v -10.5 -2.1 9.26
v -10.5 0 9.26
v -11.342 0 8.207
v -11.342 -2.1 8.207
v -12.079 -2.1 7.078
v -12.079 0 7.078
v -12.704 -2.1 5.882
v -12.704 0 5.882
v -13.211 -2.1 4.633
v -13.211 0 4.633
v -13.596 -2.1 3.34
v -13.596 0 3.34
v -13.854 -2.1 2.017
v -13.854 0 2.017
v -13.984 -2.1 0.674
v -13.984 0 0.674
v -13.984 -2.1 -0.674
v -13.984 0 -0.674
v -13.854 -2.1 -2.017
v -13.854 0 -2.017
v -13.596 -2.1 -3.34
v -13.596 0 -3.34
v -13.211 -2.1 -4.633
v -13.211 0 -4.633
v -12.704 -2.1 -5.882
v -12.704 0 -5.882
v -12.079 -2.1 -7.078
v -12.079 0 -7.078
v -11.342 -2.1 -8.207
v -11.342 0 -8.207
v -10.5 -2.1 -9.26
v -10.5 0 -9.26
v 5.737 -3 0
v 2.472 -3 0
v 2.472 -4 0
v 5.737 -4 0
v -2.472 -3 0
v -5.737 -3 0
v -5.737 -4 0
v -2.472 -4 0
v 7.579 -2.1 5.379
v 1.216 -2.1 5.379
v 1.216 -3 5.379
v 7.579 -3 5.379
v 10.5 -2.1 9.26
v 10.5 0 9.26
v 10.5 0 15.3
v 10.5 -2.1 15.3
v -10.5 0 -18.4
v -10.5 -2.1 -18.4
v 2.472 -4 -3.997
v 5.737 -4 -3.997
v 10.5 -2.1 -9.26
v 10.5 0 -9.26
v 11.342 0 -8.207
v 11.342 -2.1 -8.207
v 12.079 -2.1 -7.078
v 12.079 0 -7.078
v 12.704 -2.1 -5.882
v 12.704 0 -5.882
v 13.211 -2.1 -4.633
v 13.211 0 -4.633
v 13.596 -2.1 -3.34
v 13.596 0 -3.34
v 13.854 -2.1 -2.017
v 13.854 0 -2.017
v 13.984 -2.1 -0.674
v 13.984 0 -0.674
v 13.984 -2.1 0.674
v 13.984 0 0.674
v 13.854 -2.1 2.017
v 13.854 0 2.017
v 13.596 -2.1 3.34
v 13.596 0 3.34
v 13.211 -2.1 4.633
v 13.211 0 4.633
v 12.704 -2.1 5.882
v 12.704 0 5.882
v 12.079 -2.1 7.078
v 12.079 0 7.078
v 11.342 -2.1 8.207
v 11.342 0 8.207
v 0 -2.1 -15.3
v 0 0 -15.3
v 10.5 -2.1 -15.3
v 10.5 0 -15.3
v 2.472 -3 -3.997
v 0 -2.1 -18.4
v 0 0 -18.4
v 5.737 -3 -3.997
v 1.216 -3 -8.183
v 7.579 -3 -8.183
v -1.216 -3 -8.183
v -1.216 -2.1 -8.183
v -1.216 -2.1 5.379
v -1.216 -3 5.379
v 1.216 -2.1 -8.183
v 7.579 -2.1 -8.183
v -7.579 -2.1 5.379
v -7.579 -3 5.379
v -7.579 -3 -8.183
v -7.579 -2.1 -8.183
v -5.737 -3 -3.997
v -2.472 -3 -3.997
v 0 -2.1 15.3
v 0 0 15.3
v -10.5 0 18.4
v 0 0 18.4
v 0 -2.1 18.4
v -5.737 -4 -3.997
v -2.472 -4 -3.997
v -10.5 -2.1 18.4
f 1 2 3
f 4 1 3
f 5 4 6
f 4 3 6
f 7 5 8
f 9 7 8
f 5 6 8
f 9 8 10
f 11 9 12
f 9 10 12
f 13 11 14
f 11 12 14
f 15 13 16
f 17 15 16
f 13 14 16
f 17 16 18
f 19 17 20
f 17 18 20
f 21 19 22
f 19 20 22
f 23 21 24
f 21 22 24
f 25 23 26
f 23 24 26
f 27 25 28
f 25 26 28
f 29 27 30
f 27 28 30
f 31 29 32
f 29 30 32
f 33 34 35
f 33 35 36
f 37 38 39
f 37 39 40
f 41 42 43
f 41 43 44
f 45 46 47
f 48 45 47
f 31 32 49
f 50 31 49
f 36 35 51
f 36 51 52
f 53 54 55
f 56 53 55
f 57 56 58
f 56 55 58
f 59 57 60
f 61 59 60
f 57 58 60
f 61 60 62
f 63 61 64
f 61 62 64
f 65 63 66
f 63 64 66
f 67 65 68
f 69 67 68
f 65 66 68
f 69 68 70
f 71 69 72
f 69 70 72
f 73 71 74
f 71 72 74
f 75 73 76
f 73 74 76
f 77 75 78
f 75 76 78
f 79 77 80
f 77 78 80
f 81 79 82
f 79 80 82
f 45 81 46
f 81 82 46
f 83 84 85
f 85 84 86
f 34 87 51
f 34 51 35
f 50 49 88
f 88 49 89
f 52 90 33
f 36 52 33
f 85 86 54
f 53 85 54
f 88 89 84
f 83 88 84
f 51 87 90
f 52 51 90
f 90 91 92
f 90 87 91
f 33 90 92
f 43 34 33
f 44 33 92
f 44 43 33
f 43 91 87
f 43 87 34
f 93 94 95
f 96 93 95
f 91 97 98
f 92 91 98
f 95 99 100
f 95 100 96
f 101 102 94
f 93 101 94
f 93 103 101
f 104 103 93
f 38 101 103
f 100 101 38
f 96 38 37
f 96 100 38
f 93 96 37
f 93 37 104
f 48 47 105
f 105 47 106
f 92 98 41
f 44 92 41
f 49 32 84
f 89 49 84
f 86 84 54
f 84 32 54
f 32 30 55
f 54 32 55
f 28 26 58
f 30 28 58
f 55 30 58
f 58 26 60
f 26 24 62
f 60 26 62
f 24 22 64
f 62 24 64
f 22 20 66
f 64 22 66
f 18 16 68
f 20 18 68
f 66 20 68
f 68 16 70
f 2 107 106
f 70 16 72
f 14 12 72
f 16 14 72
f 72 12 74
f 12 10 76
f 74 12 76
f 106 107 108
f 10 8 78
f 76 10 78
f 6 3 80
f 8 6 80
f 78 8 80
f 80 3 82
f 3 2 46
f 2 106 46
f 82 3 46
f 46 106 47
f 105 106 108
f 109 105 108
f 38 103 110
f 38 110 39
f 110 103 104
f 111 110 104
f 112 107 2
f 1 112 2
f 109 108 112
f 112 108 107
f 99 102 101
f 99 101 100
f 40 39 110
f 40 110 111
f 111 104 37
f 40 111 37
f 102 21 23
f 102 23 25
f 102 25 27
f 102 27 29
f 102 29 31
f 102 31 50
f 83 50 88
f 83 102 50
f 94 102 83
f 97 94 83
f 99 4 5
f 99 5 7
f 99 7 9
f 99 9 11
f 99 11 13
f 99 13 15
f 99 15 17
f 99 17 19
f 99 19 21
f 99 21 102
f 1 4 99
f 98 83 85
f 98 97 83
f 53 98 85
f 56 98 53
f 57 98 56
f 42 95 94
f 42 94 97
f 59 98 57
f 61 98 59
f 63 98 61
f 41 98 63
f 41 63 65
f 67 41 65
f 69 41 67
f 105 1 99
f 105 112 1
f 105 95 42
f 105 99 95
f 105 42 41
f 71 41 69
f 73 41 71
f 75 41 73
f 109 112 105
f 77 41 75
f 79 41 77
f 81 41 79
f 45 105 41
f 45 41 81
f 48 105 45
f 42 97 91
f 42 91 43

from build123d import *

# Parameters (mm, degrees)
F2_DEPTH = 2.1
F1_W     = 6.362536
F1_H     = 13.562245
F1_W_2   = 3.264985
F1_H_2   = 3.997409
F3_DEPTH = 3
F4_DEPTH = 4


with BuildPart() as f2:
    # F0 (on Front) → F2 (new body)
    with BuildSketch(Plane.XZ):
        with BuildLine():
            Line((-10.5, 18.4), (-10.5, 9.26013))
            ThreePointArc((-10.5, 9.26013), (-14, 0), (-10.5, -9.26013))
            Line((-10.5, -9.26013), (-10.5, -18.4))
            Line((-10.5, -18.4), (0, -18.4))
            Line((0, -18.4), (0, -15.3))
            Line((0, -15.3), (10.5, -15.3))
            Line((10.5, -15.3), (10.5, -9.26013))
            ThreePointArc((10.5, -9.26013), (14, 0), (10.5, 9.26013))
            Line((10.5, 9.26013), (10.5, 15.3))
            Line((10.5, 15.3), (0, 15.3))
            Line((0, 15.3), (0, 18.4))
            Line((0, 18.4), (-10.5, 18.4))
        make_face()
    extrude(amount=F2_DEPTH)

    # F1 (on face) → F3 (join)
    with BuildSketch(Plane.XZ):
        with Locations((-4.397359, -1.402165)):
            Rectangle(F1_W, F1_H)
        with Locations((-4.104347, -1.998704)):
            Rectangle(F1_W_2, F1_H_2, mode=Mode.SUBTRACT)
        with Locations((4.397359, -1.402165)):
            Rectangle(F1_W, F1_H)
        with Locations((4.104347, -1.998704)):
            Rectangle(F1_W_2, F1_H_2, mode=Mode.SUBTRACT)
    extrude(amount=F3_DEPTH)

    # F1 (on face) → F4 (join)
    with BuildSketch(Plane.XZ):
        with Locations((-4.104347, -1.998704)):
            Rectangle(F1_W_2, F1_H_2)
        with Locations((4.104347, -1.998704)):
            Rectangle(F1_W_2, F1_H_2)
    extrude(amount=F4_DEPTH)


solid = f2.part
